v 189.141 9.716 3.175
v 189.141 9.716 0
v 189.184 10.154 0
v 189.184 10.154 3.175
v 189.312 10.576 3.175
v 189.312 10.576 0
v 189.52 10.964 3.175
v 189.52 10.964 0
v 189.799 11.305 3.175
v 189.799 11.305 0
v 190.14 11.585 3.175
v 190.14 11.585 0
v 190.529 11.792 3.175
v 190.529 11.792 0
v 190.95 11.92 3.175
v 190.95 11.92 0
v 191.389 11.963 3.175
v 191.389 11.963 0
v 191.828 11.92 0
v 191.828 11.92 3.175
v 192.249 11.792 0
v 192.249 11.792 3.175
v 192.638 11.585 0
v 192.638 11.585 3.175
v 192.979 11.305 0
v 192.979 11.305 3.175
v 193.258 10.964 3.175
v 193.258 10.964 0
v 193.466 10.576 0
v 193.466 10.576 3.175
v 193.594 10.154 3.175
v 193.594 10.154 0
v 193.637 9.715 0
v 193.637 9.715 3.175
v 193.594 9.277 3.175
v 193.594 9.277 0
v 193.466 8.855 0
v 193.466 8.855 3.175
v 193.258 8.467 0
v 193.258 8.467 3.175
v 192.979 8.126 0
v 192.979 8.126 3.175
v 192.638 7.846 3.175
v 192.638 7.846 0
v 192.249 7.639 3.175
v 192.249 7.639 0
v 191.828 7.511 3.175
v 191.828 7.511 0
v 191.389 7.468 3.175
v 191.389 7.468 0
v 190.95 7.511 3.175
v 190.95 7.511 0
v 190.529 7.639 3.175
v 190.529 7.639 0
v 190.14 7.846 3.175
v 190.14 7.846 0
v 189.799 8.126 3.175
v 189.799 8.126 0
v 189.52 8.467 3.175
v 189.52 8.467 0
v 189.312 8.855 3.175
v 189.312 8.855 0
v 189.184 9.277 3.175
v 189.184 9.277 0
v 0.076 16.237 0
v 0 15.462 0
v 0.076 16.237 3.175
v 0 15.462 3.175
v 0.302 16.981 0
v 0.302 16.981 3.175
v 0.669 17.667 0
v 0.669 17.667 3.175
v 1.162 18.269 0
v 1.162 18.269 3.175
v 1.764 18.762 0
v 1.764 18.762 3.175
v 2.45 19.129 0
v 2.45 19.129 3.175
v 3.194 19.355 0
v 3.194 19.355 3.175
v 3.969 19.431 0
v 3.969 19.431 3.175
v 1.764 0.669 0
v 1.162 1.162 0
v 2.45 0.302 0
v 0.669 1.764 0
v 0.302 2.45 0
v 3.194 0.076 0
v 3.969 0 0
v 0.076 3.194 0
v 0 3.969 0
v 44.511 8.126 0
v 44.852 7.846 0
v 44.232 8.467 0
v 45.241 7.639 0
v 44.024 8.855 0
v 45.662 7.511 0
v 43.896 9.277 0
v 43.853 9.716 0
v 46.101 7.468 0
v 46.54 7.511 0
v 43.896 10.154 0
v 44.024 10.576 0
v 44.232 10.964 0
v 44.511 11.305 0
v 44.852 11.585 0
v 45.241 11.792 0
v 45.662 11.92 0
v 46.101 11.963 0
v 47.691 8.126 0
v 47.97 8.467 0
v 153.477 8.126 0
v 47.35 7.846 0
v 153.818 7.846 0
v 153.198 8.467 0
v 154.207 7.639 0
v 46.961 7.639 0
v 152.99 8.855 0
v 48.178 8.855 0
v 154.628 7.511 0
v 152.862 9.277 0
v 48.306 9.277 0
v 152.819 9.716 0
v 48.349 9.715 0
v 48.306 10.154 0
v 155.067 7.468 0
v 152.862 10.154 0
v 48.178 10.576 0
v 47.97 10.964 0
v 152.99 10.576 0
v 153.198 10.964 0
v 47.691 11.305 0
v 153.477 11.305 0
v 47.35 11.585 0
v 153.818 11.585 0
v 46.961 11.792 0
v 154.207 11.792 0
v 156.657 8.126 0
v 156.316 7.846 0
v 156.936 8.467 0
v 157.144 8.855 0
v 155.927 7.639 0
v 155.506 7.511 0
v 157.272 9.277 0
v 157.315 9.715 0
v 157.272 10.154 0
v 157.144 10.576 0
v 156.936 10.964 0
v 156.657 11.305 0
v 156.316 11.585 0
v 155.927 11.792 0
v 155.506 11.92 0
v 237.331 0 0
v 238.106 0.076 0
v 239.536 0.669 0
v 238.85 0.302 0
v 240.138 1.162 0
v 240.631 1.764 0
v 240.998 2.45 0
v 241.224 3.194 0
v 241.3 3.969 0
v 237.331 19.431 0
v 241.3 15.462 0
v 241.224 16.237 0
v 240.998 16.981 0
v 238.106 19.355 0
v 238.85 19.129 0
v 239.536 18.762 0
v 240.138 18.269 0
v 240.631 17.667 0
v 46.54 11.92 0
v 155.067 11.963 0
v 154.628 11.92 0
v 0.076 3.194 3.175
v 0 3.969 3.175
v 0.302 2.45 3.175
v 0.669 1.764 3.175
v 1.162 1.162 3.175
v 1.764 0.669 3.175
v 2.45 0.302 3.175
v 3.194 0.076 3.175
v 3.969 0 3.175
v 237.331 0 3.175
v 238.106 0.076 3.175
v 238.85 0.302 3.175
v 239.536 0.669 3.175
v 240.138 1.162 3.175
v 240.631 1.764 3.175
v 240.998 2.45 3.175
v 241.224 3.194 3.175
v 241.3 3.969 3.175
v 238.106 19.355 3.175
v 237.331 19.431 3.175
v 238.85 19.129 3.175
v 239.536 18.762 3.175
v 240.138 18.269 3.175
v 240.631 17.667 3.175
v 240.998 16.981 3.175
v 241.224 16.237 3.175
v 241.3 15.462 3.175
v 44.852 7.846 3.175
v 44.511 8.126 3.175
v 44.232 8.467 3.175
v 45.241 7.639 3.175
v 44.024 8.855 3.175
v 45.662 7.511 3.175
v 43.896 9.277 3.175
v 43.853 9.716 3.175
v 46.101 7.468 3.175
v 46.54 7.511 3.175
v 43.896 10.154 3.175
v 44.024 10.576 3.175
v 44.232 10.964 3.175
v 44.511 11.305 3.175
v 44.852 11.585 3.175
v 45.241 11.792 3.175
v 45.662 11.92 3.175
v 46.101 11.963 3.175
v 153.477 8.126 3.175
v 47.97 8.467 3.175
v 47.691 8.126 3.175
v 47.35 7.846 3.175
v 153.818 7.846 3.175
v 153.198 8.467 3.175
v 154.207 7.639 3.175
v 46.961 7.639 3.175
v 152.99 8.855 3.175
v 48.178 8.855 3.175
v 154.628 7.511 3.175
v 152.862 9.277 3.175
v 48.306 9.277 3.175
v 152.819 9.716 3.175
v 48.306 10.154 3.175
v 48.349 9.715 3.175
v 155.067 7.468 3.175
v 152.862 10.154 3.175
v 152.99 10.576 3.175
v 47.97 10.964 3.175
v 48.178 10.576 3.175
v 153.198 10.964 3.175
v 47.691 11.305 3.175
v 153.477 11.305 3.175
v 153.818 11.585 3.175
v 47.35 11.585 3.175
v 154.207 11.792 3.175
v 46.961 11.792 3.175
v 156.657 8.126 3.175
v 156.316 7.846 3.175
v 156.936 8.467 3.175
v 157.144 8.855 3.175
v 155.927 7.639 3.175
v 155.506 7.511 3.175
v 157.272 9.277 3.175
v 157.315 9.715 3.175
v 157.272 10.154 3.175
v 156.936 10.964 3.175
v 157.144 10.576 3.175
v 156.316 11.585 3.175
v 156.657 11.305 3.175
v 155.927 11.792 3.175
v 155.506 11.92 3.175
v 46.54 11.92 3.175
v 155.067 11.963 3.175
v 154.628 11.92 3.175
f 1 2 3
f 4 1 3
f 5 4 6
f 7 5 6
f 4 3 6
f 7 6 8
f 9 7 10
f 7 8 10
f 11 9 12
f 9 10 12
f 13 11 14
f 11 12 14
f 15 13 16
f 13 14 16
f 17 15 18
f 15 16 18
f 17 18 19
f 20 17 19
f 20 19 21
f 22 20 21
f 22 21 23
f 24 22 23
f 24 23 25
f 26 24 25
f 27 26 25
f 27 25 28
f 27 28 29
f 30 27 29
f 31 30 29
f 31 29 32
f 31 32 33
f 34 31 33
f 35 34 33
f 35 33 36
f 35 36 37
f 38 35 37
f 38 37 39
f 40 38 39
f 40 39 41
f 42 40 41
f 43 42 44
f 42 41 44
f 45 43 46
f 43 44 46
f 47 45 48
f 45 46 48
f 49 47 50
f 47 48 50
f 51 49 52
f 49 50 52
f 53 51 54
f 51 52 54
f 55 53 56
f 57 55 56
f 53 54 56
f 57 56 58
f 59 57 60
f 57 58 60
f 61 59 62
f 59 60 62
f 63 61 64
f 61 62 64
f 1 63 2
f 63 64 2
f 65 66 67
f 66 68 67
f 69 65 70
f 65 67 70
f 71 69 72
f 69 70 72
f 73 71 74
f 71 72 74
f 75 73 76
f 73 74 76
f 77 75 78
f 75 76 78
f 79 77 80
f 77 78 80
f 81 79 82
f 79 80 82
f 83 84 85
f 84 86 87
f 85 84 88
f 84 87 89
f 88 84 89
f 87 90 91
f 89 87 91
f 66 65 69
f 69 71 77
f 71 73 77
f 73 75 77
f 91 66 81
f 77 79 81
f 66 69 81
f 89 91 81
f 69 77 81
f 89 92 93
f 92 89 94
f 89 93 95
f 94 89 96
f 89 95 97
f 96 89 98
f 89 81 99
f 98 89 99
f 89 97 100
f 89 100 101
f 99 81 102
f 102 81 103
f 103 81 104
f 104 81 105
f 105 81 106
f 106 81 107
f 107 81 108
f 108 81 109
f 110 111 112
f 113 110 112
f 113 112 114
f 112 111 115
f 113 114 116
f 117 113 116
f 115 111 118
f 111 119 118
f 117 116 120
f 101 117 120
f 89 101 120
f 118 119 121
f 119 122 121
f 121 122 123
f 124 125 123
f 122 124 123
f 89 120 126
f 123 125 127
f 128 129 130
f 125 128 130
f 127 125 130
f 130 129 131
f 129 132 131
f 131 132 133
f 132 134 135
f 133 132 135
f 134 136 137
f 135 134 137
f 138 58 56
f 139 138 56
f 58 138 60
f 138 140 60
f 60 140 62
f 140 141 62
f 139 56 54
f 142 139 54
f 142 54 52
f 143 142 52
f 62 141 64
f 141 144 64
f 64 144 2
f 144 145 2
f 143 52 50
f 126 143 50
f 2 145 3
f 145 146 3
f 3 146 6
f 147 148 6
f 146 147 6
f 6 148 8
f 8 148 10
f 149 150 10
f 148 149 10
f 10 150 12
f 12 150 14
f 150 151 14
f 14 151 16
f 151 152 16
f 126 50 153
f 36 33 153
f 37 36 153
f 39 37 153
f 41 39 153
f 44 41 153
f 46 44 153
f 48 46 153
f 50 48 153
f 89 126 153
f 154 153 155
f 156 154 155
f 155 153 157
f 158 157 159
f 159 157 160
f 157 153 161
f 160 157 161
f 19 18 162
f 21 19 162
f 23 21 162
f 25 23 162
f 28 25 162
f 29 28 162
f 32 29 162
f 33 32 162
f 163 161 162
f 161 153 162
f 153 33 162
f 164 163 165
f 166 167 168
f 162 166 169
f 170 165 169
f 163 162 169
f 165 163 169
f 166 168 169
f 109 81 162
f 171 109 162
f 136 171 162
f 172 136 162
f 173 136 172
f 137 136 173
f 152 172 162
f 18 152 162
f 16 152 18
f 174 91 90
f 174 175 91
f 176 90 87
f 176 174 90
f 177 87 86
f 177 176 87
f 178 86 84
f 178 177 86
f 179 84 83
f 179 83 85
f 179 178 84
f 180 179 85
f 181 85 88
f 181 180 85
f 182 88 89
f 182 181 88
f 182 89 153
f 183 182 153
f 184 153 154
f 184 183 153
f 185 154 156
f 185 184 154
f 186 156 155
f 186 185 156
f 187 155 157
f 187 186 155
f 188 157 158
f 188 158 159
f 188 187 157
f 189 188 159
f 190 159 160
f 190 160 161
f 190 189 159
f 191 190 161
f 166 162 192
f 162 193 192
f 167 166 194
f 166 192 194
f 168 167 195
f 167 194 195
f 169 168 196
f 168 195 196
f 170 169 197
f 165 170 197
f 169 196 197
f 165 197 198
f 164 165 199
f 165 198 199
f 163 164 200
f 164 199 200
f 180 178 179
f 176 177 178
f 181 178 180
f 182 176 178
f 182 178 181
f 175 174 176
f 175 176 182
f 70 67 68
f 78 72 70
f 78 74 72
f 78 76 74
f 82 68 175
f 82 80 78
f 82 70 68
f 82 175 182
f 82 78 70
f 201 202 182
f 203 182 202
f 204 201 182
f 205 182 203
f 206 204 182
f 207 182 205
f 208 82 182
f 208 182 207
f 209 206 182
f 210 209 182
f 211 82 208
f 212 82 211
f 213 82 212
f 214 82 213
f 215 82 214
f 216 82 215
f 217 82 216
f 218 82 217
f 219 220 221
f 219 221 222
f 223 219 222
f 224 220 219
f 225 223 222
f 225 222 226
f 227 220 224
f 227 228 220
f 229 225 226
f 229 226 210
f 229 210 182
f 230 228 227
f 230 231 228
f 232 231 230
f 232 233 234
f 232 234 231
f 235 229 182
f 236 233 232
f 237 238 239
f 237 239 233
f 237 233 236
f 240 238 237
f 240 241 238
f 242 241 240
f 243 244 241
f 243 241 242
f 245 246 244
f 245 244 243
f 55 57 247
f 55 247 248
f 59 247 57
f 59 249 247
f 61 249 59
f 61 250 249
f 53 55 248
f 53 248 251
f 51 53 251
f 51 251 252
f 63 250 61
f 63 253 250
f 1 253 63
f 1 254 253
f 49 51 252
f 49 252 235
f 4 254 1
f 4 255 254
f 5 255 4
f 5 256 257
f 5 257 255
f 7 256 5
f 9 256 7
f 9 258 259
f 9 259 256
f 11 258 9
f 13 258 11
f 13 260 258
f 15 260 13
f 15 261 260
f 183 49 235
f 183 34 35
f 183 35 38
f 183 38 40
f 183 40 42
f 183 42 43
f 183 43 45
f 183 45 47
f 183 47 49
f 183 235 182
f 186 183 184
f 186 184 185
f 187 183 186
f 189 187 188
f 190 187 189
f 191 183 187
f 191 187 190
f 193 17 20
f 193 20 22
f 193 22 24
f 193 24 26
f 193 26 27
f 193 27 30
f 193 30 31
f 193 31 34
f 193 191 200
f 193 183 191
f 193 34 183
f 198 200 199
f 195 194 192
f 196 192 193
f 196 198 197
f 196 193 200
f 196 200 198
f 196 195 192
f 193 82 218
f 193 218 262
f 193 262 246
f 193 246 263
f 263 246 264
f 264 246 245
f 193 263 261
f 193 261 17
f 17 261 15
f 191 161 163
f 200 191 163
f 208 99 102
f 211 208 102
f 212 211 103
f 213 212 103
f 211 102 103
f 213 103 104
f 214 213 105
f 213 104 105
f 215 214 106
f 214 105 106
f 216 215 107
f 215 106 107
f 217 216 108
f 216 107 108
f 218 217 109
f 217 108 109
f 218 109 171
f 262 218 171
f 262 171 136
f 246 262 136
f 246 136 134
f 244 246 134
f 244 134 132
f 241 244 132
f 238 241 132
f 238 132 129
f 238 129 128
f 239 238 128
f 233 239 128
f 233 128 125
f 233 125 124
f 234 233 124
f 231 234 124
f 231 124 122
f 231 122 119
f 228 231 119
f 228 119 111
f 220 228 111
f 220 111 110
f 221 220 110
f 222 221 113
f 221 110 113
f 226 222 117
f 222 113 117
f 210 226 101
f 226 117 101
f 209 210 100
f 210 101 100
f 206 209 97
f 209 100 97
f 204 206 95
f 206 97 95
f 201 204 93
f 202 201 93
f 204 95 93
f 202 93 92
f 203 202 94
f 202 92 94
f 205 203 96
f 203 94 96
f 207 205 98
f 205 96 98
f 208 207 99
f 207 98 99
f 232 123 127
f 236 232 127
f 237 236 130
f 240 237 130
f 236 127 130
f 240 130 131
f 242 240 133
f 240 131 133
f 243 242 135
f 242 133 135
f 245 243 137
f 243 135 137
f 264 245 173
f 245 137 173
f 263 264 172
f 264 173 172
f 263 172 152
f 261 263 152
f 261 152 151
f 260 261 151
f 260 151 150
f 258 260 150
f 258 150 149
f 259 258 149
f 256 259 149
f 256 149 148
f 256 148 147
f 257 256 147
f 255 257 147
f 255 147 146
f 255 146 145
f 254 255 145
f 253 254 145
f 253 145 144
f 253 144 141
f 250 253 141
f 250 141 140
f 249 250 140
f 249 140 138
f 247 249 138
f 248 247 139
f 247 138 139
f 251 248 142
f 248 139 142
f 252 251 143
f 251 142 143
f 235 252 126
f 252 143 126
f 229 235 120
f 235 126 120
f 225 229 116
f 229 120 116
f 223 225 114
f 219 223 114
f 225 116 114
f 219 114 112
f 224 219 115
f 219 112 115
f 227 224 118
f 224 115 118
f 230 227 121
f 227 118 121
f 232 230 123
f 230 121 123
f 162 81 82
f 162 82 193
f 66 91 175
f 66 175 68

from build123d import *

# Parameters (mm, degrees)
SKETCH1_W             = 241.3
SKETCH1_H             = 19.431
BOSS_EXTRUDE1_DEPTH   = 3.175
F_8_CLEARANCE_HOLE1_D = 4.4958
FILLET1_R             = 3.96875


with BuildPart() as part:
    # Sketch1 → Boss-Extrude1 (new body)
    with BuildSketch(Plane.XY):
        with Locations((120.65, 9.7155)):
            Rectangle(SKETCH1_W, SKETCH1_H)
    extrude(amount=BOSS_EXTRUDE1_DEPTH)

    # #8 Clearance Hole1 (through all)
    with Locations(Plane.XY.offset(3.175)):
        with Locations((46.101, 9.7155), (155.067, 9.7155), (191.389, 9.7155)):
            Hole(F_8_CLEARANCE_HOLE1_D / 2)

    # Fillet1
    fillet1_edges = [part.edges().sort_by_distance(p)[0] for p in [
        (0, 19.431, 1.5875),
        (241.3, 19.431, 1.5875),
        (241.3, 0, 1.5875),
        (0, 0, 1.5875),
    ]]
    fillet(fillet1_edges, radius=FILLET1_R)


solid = part.part
